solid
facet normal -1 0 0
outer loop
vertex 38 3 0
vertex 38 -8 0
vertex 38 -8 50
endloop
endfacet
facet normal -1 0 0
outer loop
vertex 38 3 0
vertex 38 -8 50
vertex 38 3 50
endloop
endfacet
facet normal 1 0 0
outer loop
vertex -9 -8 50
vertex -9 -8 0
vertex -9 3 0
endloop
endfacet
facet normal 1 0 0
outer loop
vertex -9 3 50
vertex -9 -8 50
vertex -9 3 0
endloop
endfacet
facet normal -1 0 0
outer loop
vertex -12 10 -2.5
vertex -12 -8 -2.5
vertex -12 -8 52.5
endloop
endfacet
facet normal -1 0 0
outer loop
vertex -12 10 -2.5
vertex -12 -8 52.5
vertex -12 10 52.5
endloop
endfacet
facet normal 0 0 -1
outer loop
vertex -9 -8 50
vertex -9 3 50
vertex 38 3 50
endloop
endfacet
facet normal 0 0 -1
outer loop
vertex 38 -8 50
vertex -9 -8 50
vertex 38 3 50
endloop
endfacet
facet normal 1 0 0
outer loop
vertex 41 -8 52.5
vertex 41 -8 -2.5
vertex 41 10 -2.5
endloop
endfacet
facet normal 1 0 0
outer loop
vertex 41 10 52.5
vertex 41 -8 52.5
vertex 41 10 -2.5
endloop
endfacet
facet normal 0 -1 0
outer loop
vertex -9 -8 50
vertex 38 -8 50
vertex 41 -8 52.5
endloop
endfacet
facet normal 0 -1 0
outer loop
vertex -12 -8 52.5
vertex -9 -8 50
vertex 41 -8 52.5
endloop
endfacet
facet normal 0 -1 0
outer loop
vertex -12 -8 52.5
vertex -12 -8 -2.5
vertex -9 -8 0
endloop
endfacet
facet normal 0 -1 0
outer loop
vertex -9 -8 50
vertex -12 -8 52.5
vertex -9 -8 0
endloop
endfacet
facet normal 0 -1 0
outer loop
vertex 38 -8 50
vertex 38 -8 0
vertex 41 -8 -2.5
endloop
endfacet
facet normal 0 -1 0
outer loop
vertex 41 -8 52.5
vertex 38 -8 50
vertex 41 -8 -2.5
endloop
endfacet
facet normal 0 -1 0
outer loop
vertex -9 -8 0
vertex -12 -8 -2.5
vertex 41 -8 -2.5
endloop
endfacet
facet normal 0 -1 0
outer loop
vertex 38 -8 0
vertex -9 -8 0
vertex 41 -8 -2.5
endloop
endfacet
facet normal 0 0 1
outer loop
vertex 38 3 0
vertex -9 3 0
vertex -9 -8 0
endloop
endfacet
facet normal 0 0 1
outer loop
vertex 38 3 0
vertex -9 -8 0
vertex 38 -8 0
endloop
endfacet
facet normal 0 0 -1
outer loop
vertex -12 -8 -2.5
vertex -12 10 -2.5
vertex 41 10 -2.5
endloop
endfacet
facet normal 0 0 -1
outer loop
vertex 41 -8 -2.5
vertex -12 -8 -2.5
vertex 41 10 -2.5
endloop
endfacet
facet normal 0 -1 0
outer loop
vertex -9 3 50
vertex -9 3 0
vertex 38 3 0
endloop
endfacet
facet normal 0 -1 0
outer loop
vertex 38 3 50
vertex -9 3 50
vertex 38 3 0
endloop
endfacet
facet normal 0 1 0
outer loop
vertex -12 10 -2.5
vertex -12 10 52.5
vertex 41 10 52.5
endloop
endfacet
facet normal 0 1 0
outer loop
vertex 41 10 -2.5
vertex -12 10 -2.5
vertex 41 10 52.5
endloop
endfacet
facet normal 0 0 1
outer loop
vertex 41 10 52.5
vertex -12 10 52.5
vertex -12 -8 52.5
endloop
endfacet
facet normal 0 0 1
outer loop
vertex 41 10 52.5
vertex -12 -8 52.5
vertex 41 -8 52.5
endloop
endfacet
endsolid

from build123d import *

# Parameters (mm, degrees)
BOX031_W     = 53
BOX031_H     = 7
BOX031_DEPTH = 55
BOX029_W     = 47
BOX029_H     = 12
BOX029_DEPTH = 50
BOX030_W     = 53
BOX030_H     = 11
BOX030_DEPTH = 55


with BuildPart() as cube030:
    # Box031 → Box031 (new body)
    with BuildSketch(Plane(origin=(-12, 3, -2.5), x_dir=(1, 0, 0), z_dir=(0, 0, 1))):
        with Locations((26.5, 3.5)):
            Rectangle(BOX031_W, BOX031_H)
    extrude(amount=BOX031_DEPTH)


with BuildPart() as cube028:
    # Box029 → Box029 (new body)
    with BuildSketch(Plane(origin=(-9, -8, 0), x_dir=(1, 0, 0), z_dir=(0, 0, 1))):
        with Locations((23.5, 6)):
            Rectangle(BOX029_W, BOX029_H)
    extrude(amount=BOX029_DEPTH)


with BuildPart() as fusion096:
    # Box030 → Box030 (new body)
    with BuildSketch(Plane(origin=(-12, -8, -2.5), x_dir=(1, 0, 0), z_dir=(0, 0, 1))):
        with Locations((26.5, 5.5)):
            Rectangle(BOX030_W, BOX030_H)
    extrude(amount=BOX030_DEPTH)

    # Cut045020: cut Cube028
    add(cube028.part, mode=Mode.SUBTRACT)

    # Fusion096: union Cube030
    add(cube030.part)


solid = fusion096.part
